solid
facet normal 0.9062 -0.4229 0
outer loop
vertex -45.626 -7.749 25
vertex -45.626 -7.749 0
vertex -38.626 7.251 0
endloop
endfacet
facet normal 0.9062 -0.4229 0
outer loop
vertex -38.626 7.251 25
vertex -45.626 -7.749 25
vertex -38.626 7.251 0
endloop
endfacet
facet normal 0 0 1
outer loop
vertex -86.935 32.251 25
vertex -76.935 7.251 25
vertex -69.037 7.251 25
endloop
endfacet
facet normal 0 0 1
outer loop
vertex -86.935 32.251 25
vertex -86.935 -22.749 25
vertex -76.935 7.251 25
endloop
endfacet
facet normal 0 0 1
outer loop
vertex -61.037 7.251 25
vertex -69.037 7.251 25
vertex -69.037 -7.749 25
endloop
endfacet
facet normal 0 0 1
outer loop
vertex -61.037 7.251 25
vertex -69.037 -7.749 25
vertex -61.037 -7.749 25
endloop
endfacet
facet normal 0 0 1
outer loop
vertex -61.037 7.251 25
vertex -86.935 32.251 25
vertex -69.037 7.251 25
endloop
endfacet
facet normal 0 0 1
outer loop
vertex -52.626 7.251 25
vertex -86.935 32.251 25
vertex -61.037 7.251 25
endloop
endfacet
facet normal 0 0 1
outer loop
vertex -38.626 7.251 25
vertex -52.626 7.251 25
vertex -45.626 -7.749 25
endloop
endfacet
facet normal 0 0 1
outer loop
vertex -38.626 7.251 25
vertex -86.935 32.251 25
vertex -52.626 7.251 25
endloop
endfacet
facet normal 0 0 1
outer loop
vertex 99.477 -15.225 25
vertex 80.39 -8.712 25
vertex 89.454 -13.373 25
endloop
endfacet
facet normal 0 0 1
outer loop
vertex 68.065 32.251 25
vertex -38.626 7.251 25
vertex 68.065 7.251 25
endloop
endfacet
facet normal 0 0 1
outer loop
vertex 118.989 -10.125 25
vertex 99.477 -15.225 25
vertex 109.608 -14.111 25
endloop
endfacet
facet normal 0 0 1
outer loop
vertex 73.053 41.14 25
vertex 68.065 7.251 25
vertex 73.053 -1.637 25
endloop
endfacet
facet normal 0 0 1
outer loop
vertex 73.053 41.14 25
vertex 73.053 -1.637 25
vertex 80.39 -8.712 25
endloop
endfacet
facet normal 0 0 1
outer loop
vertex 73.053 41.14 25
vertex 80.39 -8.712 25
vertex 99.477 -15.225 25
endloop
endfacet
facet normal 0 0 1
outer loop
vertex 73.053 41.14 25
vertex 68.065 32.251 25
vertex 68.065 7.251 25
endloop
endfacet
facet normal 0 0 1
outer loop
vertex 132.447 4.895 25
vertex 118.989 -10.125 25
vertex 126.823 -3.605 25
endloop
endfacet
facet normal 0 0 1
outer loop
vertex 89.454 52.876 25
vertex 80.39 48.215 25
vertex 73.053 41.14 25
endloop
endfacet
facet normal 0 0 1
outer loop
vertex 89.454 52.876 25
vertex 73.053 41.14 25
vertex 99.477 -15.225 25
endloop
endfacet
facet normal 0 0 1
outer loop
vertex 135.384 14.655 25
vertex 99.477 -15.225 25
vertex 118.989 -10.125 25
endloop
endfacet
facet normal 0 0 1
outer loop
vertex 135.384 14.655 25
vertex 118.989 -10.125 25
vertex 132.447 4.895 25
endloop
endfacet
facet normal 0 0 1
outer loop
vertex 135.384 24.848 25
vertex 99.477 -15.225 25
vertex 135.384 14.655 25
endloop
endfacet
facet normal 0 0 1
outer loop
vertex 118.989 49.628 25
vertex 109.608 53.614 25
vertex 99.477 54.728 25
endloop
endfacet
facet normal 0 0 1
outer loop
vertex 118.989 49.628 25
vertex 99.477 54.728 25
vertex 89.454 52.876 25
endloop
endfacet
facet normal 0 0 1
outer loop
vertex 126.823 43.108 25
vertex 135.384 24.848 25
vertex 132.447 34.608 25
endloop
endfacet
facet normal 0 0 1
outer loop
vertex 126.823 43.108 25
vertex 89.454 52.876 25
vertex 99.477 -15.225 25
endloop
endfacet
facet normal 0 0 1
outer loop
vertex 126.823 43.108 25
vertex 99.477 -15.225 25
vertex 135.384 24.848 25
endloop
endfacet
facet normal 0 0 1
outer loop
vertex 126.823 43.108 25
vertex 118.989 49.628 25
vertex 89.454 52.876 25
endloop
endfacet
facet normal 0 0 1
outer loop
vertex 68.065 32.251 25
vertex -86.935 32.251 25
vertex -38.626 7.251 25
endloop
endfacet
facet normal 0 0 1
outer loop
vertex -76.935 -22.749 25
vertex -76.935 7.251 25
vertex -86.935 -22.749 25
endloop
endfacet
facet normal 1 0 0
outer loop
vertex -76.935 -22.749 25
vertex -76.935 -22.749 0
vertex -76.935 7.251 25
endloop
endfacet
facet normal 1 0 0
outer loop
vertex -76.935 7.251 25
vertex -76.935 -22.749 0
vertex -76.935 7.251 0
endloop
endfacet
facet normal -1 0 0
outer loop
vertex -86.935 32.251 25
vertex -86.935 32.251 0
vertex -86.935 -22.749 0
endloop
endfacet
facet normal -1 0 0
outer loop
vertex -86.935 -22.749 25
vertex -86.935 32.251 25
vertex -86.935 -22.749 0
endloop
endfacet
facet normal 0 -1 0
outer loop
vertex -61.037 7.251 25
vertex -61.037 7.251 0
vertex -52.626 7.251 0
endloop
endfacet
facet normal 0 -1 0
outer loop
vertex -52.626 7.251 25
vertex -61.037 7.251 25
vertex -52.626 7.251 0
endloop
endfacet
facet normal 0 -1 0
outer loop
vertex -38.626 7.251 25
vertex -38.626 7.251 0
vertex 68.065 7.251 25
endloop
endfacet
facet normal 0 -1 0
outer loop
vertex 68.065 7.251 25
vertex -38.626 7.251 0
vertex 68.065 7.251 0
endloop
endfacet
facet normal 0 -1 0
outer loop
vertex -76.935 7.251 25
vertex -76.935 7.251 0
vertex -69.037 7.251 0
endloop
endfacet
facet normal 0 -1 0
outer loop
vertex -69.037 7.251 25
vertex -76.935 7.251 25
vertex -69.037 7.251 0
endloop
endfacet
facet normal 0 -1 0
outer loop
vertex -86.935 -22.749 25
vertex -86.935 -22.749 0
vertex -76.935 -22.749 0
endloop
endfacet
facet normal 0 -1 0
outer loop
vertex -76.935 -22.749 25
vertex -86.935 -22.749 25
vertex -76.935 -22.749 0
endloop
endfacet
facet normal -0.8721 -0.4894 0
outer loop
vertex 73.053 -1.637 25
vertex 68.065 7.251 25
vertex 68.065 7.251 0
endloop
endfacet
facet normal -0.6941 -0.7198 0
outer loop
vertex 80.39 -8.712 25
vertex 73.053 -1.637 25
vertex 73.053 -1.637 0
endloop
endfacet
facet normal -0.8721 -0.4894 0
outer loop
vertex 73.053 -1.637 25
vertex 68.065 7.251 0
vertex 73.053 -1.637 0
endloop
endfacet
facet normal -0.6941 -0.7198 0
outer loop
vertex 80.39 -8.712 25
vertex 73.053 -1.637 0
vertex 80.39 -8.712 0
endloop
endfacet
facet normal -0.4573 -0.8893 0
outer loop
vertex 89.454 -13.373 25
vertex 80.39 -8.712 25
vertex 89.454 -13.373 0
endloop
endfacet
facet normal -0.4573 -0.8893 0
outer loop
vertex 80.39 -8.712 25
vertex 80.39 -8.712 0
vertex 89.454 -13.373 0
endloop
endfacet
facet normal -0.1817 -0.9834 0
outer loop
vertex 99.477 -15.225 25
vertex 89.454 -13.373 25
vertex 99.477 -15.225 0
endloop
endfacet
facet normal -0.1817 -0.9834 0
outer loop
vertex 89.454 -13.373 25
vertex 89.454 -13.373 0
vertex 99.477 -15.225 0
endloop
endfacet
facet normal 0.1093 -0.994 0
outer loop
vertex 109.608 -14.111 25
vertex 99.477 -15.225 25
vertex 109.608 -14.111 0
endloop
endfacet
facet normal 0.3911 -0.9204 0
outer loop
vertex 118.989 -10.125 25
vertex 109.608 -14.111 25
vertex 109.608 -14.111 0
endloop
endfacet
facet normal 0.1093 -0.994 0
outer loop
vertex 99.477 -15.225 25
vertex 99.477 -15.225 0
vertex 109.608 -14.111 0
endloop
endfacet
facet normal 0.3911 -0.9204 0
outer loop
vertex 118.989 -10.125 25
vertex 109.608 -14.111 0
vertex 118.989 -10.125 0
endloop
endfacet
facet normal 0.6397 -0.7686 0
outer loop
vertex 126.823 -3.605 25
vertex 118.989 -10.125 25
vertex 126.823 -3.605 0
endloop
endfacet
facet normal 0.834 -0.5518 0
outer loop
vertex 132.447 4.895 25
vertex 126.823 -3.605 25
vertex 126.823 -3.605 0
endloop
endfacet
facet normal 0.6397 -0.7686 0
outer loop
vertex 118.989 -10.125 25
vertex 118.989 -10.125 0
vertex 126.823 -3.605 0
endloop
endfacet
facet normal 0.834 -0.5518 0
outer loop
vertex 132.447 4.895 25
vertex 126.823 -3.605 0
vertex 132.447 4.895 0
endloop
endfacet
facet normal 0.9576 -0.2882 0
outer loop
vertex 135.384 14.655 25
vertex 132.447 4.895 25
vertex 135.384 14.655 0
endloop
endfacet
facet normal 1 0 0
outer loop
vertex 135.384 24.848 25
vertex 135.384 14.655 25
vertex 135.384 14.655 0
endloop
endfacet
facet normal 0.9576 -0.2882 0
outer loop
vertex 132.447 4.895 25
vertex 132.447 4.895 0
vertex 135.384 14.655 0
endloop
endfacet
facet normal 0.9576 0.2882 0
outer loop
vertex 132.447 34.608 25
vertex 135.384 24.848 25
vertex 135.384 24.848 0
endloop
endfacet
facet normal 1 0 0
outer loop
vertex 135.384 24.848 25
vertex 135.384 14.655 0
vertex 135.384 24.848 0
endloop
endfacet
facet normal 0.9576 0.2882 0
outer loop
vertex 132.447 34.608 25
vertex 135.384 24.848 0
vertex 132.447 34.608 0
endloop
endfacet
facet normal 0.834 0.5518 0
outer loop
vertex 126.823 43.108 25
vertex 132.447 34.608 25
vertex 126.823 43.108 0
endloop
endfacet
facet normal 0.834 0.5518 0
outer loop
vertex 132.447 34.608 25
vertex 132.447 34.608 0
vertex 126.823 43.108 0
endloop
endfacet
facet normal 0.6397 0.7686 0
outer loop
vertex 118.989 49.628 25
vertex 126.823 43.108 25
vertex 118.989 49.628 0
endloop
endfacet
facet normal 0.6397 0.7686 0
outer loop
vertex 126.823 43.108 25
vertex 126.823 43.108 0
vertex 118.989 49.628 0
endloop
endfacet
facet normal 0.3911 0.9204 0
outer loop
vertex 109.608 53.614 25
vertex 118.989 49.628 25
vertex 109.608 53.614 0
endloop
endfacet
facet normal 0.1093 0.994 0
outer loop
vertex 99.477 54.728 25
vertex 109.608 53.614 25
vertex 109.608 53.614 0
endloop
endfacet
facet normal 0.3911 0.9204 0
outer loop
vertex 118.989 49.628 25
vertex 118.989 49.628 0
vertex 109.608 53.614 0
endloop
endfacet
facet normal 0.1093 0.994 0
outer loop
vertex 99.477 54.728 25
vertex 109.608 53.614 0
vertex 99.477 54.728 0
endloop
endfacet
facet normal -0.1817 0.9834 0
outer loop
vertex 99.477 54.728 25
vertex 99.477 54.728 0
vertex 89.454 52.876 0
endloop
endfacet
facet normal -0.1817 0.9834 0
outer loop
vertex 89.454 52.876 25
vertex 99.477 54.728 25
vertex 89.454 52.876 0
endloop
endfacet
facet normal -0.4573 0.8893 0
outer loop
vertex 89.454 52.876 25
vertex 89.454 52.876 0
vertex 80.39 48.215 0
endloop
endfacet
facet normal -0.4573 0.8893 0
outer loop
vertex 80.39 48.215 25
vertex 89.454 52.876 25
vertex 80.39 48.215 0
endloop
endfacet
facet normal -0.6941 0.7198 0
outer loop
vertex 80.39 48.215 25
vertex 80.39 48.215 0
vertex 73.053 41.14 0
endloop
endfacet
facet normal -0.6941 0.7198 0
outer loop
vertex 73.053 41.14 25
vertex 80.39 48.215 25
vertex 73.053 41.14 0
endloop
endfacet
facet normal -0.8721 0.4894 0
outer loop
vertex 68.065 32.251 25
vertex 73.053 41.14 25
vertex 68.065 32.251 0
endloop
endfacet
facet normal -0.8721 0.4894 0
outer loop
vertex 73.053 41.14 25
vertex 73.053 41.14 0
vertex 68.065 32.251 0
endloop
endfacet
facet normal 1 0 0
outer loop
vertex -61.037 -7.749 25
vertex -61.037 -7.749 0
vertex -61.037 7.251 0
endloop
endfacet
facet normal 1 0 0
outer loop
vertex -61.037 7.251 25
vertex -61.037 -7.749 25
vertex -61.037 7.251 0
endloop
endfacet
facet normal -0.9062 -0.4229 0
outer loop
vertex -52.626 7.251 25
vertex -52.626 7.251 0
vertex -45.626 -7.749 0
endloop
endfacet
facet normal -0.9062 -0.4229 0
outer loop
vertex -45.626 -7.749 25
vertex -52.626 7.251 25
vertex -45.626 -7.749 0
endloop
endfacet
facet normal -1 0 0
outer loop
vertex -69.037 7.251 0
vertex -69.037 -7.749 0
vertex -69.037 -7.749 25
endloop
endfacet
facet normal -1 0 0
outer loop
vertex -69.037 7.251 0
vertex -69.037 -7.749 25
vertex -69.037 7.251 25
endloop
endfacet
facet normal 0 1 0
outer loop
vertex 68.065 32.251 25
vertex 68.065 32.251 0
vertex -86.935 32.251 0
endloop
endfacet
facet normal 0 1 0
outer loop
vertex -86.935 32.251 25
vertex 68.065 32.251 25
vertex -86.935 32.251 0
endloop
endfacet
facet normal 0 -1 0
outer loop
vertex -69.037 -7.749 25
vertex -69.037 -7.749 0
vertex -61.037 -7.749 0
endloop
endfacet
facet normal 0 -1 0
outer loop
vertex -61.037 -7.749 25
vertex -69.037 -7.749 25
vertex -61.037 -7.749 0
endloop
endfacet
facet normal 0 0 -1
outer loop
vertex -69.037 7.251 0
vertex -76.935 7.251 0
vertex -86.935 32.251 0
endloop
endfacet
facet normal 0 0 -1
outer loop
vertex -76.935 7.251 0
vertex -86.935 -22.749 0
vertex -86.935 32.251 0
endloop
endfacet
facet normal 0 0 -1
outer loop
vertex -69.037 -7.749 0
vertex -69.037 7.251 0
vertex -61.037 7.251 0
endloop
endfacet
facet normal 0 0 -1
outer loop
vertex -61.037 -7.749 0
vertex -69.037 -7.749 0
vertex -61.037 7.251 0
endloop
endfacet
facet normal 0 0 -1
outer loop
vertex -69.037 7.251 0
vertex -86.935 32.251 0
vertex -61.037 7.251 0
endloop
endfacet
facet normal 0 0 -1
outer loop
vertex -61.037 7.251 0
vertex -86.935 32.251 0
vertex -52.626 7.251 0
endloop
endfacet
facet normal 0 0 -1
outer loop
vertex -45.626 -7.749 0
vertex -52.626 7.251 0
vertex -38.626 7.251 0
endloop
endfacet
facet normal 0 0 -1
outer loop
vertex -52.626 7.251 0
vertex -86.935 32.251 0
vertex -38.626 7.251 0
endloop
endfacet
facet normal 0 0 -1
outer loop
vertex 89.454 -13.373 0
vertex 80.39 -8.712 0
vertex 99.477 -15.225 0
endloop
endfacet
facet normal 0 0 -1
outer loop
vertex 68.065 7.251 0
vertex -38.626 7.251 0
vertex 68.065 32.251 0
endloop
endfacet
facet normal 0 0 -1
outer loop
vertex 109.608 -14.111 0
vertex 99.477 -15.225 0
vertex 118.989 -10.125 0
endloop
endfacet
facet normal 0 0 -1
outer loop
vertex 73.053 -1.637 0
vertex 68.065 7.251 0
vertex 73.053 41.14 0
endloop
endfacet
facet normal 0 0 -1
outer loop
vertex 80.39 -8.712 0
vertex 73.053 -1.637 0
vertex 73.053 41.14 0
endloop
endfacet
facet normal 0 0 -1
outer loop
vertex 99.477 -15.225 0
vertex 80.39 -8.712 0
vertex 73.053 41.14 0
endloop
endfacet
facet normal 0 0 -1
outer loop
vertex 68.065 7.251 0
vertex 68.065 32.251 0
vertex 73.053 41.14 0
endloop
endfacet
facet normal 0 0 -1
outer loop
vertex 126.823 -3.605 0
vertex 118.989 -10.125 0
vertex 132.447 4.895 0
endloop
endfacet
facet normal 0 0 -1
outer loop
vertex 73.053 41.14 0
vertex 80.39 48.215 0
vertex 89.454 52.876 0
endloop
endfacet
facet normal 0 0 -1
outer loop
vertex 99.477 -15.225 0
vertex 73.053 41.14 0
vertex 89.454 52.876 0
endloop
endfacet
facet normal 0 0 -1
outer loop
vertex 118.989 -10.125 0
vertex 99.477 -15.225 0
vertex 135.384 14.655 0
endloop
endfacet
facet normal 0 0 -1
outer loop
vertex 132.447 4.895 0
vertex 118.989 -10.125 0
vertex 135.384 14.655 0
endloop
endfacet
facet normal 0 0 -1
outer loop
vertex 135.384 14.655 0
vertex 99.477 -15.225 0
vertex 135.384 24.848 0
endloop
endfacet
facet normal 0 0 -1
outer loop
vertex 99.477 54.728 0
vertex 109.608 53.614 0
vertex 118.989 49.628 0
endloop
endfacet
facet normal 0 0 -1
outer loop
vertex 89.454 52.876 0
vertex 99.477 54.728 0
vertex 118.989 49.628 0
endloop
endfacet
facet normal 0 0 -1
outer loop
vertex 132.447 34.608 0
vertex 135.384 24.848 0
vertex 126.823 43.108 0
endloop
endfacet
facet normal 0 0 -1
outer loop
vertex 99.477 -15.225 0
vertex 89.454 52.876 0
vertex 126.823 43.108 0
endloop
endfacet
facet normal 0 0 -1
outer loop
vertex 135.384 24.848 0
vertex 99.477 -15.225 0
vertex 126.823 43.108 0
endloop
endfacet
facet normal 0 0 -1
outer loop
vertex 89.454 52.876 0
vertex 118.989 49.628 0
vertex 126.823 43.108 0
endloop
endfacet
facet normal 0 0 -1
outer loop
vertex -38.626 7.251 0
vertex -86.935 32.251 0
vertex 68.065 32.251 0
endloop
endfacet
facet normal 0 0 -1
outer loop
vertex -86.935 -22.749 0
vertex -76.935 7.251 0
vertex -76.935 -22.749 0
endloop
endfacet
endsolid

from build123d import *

# Parameters (mm, degrees)
F0_R     = 17.5
F0_W     = 10
F0_H     = 30
F0_W_2   = 8
F0_H_2   = 15
F1_DEPTH = 25


with BuildPart() as f1:
    # F0 (on Top) → F1 (new body)
    with BuildSketch(Plane.XY):
        Polygon((68.0650311708, 32.2513162987), (-86.9349688292, 32.2513162987), (-86.9349688292, 7.2513162987), (-76.9349688292, 7.2513162987), (-69.0365880728, 7.2513162987), (-61.0365880728, 7.2513162987), (-52.6264092635, 7.2513162987), (-45.6264092635, 7.2513162987), (-38.6264092635, 7.2513162987), (68.0650311708, 7.2513162987), align=None)
        with BuildLine():
            ThreePointArc((68.0650311708, 7.2513162987), (135.7567732474, 19.7513162987), (68.0650311708, 32.2513162987))
            Line((68.0650311708, 32.2513162987), (68.0650311708, 7.2513162987))
        make_face()
        with Locations((100.7567732474, 19.7513162987)):
            Circle(F0_R, mode=Mode.SUBTRACT)
        with Locations((100.7567732474, 19.7513162987)):
            Circle(F0_R)
        with Locations((-81.9349688292, -7.7486837013)):
            Rectangle(F0_W, F0_H)
        with Locations((-65.0365880728, -0.2486837013)):
            Rectangle(F0_W_2, F0_H_2)
        Polygon((-45.6264092635, -7.7487440012), (-38.6264092635, 7.2513162987), (-45.6264092635, 7.2513162987), (-52.6264092635, 7.2513162987), align=None)
    extrude(amount=F1_DEPTH)


solid = f1.part
